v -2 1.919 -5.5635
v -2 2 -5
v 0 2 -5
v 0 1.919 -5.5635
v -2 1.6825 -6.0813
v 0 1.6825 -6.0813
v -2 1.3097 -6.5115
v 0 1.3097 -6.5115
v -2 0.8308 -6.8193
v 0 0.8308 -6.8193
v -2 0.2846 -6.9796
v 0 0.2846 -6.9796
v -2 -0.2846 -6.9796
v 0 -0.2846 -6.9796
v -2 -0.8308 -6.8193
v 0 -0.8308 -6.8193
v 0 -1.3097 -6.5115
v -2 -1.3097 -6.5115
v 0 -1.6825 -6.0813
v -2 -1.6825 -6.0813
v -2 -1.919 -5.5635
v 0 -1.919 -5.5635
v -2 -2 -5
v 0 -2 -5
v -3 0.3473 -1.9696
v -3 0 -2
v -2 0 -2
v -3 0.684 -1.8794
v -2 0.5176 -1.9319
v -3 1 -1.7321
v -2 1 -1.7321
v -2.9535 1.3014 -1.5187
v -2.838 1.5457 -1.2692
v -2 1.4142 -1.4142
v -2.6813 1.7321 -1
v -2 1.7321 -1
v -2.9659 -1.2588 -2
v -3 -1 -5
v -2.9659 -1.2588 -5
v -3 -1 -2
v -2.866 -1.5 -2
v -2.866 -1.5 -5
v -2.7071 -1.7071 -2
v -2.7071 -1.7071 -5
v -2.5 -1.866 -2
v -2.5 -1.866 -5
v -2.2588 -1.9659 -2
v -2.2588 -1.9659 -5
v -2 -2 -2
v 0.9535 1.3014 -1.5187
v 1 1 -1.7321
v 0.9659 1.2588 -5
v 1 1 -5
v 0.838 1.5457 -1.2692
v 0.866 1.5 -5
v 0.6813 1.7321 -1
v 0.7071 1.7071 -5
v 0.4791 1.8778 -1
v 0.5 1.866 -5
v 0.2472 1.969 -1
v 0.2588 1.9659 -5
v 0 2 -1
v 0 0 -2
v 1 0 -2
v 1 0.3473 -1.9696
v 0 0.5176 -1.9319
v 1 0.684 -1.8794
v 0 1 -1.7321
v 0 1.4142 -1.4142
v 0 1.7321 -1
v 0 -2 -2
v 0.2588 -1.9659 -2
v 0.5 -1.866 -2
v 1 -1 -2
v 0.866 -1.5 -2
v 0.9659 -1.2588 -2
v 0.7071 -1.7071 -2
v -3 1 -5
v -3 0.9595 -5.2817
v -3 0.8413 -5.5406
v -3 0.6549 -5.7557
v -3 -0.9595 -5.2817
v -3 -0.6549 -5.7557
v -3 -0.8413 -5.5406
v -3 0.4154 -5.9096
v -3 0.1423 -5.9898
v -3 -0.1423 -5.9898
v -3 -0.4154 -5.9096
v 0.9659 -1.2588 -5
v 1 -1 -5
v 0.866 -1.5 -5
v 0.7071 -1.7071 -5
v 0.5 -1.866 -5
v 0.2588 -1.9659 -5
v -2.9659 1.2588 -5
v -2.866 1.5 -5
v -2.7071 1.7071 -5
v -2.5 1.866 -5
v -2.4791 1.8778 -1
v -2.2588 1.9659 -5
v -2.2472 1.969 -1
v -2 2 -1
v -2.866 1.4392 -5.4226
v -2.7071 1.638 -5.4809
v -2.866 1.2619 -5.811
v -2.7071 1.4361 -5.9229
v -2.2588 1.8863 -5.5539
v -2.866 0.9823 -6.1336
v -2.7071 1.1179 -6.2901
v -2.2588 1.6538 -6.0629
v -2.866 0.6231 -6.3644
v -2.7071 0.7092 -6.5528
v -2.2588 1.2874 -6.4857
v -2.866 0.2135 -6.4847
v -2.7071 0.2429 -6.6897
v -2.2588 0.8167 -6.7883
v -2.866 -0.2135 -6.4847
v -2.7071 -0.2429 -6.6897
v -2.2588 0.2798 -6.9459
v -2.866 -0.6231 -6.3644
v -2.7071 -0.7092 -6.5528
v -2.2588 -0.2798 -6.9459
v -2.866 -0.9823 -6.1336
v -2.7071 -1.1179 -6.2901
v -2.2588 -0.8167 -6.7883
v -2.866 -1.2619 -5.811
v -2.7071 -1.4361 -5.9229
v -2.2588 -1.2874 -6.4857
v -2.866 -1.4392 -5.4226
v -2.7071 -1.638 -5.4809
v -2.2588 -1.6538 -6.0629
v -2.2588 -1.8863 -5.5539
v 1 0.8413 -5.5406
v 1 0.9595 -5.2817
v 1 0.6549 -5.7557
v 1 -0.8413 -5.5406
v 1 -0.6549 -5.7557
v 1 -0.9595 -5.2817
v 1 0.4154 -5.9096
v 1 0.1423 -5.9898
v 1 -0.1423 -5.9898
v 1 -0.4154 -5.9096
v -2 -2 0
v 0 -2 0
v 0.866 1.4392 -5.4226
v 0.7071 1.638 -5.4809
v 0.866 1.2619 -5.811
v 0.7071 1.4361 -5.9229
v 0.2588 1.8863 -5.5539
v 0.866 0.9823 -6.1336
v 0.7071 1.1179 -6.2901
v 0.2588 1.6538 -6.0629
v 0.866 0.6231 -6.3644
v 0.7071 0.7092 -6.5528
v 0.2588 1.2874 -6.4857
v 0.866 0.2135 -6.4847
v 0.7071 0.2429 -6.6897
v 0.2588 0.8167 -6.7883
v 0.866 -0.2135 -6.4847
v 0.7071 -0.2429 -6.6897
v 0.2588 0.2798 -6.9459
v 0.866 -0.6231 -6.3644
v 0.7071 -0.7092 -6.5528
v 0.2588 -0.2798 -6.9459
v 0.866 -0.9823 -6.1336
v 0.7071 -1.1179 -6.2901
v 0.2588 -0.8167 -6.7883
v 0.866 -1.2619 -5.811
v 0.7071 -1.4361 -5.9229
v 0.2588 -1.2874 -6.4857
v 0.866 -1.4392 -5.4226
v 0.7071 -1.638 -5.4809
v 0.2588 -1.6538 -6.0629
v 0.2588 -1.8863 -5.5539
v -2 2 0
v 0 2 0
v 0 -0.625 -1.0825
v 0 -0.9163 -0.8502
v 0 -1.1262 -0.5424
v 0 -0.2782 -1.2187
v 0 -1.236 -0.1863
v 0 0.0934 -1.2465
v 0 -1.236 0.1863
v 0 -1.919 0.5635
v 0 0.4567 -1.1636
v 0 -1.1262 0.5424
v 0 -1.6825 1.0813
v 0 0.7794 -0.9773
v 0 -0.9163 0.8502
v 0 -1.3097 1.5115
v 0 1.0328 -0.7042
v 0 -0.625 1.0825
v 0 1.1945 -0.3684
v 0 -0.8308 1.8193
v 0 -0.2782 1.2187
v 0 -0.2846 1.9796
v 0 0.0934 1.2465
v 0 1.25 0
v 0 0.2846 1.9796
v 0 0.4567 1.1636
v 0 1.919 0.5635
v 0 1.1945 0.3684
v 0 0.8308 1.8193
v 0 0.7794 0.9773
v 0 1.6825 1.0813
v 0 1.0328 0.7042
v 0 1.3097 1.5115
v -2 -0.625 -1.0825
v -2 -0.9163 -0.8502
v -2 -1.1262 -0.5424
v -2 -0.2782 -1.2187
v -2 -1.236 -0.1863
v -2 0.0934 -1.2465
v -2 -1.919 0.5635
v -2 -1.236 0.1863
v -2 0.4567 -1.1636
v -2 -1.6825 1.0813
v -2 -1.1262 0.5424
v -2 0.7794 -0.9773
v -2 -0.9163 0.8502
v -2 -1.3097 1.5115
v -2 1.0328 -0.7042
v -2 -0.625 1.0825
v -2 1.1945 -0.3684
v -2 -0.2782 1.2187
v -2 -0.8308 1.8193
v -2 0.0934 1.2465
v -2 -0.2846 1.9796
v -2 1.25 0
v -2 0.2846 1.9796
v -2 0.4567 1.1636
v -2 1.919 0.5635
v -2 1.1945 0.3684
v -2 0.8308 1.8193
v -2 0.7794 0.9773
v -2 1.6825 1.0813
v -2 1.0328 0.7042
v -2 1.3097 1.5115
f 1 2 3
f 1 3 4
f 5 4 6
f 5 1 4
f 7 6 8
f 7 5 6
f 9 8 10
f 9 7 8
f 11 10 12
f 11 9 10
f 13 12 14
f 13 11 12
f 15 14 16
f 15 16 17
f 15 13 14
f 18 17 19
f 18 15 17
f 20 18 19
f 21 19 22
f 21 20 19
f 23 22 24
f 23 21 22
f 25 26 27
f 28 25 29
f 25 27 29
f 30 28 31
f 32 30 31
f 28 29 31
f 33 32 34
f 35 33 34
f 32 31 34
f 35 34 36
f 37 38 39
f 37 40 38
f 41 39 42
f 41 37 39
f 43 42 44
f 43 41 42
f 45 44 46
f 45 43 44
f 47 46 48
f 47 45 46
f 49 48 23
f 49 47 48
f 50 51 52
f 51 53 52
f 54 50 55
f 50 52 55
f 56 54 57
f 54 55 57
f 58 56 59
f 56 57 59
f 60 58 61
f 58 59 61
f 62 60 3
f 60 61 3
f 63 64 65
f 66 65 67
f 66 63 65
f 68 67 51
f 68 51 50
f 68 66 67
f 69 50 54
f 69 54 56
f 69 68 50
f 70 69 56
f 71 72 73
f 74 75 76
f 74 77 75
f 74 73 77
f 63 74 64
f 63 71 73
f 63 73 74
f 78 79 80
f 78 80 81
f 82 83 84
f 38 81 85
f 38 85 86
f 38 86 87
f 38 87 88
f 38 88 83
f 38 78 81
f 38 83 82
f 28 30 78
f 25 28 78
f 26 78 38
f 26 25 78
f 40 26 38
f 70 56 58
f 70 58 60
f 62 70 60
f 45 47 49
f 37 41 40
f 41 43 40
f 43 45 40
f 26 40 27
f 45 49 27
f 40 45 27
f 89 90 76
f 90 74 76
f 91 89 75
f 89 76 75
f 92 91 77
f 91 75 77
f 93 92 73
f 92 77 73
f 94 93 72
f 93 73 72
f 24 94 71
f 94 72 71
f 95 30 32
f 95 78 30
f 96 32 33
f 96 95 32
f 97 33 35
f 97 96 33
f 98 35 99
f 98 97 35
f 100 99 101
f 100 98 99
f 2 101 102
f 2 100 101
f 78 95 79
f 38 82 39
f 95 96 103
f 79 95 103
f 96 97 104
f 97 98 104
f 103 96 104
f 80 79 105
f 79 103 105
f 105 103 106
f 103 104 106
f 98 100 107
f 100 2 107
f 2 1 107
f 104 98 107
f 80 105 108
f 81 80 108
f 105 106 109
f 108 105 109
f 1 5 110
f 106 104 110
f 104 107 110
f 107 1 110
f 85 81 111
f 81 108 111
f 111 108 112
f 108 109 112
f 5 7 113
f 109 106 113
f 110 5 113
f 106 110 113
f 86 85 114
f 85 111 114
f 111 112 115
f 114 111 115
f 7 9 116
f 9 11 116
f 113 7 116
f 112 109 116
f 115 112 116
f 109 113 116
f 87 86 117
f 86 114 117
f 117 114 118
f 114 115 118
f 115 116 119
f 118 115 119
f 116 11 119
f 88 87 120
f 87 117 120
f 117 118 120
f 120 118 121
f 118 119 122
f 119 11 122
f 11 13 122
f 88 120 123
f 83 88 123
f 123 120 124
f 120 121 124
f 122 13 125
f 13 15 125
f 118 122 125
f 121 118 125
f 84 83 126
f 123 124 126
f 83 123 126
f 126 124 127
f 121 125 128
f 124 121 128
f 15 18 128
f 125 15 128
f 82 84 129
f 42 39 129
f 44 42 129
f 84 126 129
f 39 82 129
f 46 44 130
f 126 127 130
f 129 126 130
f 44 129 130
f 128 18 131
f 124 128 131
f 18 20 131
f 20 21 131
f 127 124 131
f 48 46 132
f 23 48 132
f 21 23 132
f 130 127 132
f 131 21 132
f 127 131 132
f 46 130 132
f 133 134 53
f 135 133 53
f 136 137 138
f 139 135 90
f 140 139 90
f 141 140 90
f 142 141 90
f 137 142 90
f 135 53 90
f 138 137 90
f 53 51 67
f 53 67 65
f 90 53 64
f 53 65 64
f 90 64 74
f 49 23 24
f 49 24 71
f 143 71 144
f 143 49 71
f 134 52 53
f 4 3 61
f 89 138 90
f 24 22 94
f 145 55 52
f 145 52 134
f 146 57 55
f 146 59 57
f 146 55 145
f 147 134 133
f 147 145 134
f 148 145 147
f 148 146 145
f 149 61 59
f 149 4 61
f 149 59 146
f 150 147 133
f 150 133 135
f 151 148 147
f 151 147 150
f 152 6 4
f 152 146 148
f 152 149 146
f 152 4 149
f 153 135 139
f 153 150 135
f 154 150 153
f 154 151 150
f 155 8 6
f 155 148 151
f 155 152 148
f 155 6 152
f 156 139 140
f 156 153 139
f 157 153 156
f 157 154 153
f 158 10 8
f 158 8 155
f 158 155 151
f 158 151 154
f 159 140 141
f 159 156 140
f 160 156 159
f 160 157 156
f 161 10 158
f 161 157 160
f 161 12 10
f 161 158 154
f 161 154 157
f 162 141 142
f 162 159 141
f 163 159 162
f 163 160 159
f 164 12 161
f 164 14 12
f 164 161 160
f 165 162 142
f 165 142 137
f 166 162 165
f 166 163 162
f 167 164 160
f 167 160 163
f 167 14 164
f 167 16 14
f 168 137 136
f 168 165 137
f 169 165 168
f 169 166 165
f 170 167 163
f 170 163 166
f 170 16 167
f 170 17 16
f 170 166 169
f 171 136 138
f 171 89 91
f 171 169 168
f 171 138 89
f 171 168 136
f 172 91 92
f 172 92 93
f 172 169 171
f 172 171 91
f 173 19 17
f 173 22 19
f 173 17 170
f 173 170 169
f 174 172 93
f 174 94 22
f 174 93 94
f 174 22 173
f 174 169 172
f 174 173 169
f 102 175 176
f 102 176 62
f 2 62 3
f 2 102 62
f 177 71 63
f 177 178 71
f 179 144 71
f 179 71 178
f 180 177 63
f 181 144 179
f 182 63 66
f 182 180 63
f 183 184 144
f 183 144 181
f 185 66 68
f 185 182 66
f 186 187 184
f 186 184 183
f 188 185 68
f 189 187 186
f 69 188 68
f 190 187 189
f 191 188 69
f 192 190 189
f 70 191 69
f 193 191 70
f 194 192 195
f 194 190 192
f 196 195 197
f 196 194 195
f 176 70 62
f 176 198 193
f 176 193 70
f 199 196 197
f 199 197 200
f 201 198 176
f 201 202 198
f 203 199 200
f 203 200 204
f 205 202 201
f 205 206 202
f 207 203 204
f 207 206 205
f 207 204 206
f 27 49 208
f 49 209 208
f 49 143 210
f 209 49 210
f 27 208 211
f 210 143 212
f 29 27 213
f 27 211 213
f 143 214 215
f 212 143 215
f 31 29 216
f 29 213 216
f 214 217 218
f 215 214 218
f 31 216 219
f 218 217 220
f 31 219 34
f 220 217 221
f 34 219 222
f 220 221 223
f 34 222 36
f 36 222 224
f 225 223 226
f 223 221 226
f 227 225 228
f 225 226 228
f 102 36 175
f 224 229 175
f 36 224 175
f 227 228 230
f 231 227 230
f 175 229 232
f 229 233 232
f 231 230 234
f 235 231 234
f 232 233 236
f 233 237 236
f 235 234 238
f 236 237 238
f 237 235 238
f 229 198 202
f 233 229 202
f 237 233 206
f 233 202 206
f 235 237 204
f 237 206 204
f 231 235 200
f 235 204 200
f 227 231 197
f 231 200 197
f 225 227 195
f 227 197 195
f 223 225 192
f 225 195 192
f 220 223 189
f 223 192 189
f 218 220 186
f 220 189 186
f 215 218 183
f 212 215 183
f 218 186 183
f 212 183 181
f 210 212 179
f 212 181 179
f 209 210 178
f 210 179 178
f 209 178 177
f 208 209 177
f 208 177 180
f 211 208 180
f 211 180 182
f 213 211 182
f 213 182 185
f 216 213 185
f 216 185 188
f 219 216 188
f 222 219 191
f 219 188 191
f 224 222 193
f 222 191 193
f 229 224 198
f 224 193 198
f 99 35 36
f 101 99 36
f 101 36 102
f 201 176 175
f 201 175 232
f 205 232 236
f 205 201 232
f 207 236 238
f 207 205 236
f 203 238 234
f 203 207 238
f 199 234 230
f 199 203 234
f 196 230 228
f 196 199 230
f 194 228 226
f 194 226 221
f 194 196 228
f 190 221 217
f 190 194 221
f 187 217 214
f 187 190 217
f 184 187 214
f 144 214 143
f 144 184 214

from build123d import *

# Parameters (mm, degrees)
F0_R     = 1.25
F1_DEPTH = 2
F3_DEPTH = 1
F5_R     = 1


# Not quite as in the source:
# - a pattern or mirror of a feature is missing from the dataset's text; its kind, count and spacing are read off the source's solid


with BuildPart() as f1:
    # F0 (on Right) → F1 (new body)
    with BuildSketch(Plane.YZ):
        with BuildLine():
            ThreePointArc((-2, 0), (0, -2), (2, 0))
            ThreePointArc((2, 0), (0, 2), (-2, 0))
        make_face()
        Circle(F0_R, mode=Mode.SUBTRACT)
        with BuildLine():
            Line((2, -5), (2, 0))
            ThreePointArc((2, 0), (0, -2), (-2, 0))
            Line((-2, 0), (-2, -5))
            ThreePointArc((-2, -5), (0, -3), (2, -5))
        make_face()
        with BuildLine():
            ThreePointArc((-2, -5), (0, -7), (2, -5))
            Line((2, -5), (-2, -5))
        make_face()
        with BuildLine():
            Line((-2, -5), (2, -5))
            ThreePointArc((2, -5), (0, -3), (-2, -5))
        make_face()
    extrude(amount=-F1_DEPTH)

    # F2 (on face) → F3 (join)
    with BuildSketch(Plane(origin=(-2, 0, 0), x_dir=(0, -1, 0), z_dir=(-1, 0, 0))):
        with BuildLine():
            ThreePointArc((0, -2), (-1, -1.7320508076), (-1.7320508076, -1))
            Line((-1.7320508076, -1), (-2, -1))
            Line((-2, -1), (-2, -4))
            Line((-2, -4), (-1.7320508076, -4))
            ThreePointArc((-1.7320508076, -4), (-1, -3.2679491924), (0, -3))
            Line((0, -3), (2, -3))
            Line((2, -3), (2, -2))
            Line((2, -2), (0, -2))
        make_face()
        with BuildLine():
            Line((-1.7320508076, -4), (-2, -4))
            Line((-2, -4), (-2, -5))
            ThreePointArc((-2, -5), (0, -7), (2, -5))
            Line((2, -5), (2, -3))
            Line((2, -3), (0, -3))
            ThreePointArc((0, -3), (-1, -3.2679491924), (-1.7320508076, -4))
        make_face()
    f3 = extrude(amount=F3_DEPTH)

    # F3_copies: F3 across plane
    add(f3.mirror(Plane(origin=(-1, 0, 0), x_dir=(0, 0, 1), z_dir=(1, 0, 0))))

    # F5
    f5_edges = [f1.edges().sort_by_distance(p)[0] for p in [
        (-3, 2, -3),
        (-3, -2, -3.5),
        (-3, 0, -7),
        (1, 0, -7),
        (1, 2, -3),
        (1, -2, -3.5),
    ]]
    fillet(f5_edges, radius=F5_R)


solid = f1.part
